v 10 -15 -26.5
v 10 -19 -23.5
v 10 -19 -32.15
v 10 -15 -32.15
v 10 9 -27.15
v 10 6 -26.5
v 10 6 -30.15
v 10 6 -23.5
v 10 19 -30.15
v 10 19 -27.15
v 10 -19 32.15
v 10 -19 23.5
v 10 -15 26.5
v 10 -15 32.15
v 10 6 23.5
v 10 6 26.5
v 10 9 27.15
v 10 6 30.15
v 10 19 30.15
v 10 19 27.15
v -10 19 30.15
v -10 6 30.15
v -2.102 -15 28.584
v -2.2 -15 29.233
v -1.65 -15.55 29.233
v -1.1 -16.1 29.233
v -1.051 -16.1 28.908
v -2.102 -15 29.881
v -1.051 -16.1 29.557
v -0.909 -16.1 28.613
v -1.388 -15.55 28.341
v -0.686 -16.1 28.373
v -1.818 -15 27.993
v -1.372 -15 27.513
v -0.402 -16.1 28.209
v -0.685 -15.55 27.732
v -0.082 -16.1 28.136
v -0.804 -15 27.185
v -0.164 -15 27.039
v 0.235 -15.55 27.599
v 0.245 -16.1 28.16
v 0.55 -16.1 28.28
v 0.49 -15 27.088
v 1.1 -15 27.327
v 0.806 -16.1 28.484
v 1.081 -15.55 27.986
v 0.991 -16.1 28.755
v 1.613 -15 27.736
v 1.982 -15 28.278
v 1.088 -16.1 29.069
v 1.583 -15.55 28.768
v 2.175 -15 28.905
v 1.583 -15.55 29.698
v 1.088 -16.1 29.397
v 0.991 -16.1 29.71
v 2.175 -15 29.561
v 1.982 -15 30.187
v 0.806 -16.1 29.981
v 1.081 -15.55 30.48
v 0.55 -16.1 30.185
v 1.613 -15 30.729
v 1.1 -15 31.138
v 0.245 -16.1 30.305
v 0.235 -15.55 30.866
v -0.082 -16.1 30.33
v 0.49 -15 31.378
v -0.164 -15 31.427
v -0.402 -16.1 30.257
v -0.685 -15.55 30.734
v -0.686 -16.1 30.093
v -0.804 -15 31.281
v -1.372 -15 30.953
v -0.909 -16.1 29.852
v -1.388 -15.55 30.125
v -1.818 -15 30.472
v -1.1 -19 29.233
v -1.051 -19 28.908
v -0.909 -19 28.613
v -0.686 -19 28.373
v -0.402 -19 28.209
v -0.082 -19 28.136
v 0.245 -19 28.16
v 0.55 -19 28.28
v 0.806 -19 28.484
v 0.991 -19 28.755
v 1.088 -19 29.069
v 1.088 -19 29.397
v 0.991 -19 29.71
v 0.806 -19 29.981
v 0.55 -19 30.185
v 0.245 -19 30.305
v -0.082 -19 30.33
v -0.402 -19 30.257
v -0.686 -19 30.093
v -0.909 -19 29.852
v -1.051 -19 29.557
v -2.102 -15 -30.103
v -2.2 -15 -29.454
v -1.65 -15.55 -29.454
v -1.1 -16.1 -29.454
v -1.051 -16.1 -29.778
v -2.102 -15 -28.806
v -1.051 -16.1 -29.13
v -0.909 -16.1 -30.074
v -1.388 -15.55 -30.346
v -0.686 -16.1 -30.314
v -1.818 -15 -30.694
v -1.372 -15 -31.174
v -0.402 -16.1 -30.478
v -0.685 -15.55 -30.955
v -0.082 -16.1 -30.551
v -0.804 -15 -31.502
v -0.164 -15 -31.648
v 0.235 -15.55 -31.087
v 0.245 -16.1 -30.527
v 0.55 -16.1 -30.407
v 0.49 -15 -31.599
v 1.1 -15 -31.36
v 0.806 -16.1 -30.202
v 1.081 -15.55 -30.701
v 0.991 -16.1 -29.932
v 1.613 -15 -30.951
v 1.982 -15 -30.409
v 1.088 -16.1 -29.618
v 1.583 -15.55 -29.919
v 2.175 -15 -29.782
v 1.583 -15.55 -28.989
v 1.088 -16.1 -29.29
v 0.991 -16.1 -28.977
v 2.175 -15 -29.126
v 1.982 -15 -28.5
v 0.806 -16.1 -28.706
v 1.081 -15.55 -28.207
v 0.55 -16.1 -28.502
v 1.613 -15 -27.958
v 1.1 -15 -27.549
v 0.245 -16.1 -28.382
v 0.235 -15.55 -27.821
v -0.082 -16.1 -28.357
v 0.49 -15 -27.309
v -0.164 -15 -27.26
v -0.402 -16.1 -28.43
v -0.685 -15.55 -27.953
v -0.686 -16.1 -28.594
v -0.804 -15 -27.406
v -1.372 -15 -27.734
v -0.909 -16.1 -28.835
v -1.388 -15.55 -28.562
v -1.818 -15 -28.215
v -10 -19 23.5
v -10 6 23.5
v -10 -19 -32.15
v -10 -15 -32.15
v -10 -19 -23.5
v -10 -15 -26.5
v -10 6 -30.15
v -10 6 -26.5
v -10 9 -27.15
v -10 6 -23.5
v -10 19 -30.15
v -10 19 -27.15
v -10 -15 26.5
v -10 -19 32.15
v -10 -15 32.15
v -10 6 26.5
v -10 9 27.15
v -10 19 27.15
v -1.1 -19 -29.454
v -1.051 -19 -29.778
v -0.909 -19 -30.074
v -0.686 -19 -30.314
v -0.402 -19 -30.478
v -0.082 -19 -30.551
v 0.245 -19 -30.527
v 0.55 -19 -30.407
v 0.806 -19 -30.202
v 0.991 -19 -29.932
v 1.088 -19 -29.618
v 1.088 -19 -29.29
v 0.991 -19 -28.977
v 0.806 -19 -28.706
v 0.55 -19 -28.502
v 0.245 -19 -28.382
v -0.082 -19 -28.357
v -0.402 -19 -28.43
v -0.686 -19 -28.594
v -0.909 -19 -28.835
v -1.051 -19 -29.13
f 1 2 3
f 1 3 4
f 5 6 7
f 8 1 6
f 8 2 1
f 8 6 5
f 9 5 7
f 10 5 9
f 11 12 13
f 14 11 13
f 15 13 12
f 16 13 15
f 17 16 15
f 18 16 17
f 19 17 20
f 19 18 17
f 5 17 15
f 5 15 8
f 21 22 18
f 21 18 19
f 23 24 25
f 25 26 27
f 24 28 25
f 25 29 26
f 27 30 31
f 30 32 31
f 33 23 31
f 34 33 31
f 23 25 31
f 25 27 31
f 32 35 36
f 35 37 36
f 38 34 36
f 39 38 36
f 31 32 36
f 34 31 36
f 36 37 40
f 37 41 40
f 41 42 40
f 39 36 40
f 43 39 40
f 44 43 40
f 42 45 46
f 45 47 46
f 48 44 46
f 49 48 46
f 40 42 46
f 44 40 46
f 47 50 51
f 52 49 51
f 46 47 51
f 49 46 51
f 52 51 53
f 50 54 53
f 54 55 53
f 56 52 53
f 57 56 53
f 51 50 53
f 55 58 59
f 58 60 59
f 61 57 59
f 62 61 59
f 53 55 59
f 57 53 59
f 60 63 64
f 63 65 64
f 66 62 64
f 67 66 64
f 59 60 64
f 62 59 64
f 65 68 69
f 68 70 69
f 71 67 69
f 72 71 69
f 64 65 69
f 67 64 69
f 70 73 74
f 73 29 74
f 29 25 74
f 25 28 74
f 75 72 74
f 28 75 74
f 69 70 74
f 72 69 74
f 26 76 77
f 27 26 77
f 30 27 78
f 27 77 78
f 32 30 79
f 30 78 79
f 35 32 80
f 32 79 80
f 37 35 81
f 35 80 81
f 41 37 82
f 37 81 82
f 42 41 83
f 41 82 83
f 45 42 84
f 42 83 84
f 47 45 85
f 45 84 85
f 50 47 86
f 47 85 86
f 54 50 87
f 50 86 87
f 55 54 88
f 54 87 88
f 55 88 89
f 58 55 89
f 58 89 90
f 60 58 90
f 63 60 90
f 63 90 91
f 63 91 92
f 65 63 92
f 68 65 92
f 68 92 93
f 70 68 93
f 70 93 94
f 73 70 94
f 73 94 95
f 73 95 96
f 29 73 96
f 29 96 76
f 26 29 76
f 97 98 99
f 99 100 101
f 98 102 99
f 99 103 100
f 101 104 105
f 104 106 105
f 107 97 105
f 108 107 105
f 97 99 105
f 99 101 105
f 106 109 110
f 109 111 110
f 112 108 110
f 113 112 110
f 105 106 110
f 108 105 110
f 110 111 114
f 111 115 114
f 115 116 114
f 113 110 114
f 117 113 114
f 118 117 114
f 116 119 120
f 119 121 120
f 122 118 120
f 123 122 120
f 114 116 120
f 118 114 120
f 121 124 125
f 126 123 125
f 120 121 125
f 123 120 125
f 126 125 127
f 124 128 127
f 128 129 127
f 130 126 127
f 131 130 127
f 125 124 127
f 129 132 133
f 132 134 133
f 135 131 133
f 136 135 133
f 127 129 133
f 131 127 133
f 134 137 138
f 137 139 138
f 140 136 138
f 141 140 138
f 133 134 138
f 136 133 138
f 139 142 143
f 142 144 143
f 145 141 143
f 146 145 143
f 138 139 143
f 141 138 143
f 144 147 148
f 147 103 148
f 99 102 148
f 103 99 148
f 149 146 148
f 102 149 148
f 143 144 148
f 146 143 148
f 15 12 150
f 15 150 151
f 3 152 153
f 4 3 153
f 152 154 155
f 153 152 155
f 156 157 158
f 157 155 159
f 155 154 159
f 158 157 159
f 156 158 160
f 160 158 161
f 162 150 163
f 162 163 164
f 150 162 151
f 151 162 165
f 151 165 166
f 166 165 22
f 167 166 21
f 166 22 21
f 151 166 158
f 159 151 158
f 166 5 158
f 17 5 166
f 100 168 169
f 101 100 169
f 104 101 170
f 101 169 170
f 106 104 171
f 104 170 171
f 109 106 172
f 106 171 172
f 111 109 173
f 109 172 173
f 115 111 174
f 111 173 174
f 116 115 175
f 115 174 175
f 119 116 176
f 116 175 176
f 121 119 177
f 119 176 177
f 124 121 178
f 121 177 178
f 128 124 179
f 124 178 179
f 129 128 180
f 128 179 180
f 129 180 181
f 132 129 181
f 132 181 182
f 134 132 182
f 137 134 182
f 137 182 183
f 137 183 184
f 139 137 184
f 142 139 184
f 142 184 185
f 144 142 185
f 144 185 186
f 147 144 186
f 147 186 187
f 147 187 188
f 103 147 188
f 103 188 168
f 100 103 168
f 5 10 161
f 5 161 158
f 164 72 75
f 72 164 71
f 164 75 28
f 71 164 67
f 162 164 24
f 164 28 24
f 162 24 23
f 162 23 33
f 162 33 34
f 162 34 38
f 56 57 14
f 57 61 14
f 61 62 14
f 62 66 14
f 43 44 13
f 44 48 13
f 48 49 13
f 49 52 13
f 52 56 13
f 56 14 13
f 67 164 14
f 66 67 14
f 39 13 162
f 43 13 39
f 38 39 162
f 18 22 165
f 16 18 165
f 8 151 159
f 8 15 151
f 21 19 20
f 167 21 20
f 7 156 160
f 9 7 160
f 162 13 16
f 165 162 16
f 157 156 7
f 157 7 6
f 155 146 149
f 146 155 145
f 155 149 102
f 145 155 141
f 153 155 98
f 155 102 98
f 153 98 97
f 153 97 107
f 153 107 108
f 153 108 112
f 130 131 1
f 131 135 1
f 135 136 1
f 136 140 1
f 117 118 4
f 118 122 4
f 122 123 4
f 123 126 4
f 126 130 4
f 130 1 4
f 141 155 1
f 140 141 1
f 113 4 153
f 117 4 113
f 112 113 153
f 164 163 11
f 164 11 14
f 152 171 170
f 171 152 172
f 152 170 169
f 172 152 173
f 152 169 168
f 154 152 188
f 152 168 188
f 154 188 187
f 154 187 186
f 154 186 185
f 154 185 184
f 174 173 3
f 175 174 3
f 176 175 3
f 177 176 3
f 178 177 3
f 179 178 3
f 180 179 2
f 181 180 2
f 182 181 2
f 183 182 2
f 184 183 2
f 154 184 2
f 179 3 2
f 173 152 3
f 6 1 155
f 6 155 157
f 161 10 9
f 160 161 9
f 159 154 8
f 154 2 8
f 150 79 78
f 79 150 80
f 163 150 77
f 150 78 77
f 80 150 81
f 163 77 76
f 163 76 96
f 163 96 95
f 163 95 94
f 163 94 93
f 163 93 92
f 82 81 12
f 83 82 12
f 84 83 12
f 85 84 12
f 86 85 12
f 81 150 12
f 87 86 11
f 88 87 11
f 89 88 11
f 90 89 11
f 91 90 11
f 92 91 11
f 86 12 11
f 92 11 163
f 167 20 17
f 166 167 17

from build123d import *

# Parameters (mm, degrees)
SKETCH1_W                                           = 60.3
SKETCH1_H                                           = 38
BOSS_EXTRUDE1_DEPTH                                 = 10
SKETCH3_W                                           = 20
SKETCH3_H                                           = 54.3
CUT_EXTRUDE1_DEPTH                                  = 10
SKETCH4_W                                           = 20
SKETCH4_H                                           = 47
CUT_EXTRUDE2_DEPTH                                  = 25
SKETCH6_W                                           = 10
SKETCH6_H                                           = 21
CUT_EXTRUDE3_DEPTH                                  = 3.65
SKETCH7_W                                           = 10
SKETCH7_H                                           = 21
CUT_EXTRUDE4_DEPTH                                  = 3.65
MOVE_FACE1_BY                                       = 2
MOVE_FACE1_2_BY                                     = 2
MOVE_FACE2_BY                                       = 10
CSK_FOR_M2_COUNTERSUNK_FLAT_HEAD_SCREW2_D           = 2.2
CSK_FOR_M2_COUNTERSUNK_FLAT_HEAD_SCREW2_DEPTH       = 4
CSK_FOR_M2_COUNTERSUNK_FLAT_HEAD_SCREW2_CSINK_D     = 4.4
CSK_FOR_M2_COUNTERSUNK_FLAT_HEAD_SCREW2_CSINK_ANGLE = 90


with BuildPart() as part:
    # Sketch1 → Boss-Extrude1 (new body)
    with BuildSketch(Plane(origin=(0, 0, 0), x_dir=(0, 0, -1), z_dir=(1, 0, 0))):
        Rectangle(SKETCH1_W, SKETCH1_H)
    extrude(amount=BOSS_EXTRUDE1_DEPTH)

    # Sketch3 → Cut-Extrude1 (cut)
    with BuildSketch(Plane(origin=(0, 19, 0), x_dir=(1, 0, 0), z_dir=(0, 1, 0))):
        Rectangle(SKETCH3_W, SKETCH3_H)
    extrude(amount=-CUT_EXTRUDE1_DEPTH, mode=Mode.SUBTRACT)

    # Sketch4 → Cut-Extrude2 (cut)
    with BuildSketch(Plane.XZ.offset(19)):
        Rectangle(SKETCH4_W, SKETCH4_H)
    extrude(amount=-CUT_EXTRUDE2_DEPTH, mode=Mode.SUBTRACT)

    # Sketch6 → Cut-Extrude3 (cut)
    with BuildSketch(Plane(origin=(0, 0, -30.15), x_dir=(-1, 0, 0), z_dir=(0, 0, -1))):
        with Locations((-5, -4.5)):
            Rectangle(SKETCH6_W, SKETCH6_H)
    extrude(amount=-CUT_EXTRUDE3_DEPTH, mode=Mode.SUBTRACT)

    # Sketch7 → Cut-Extrude4 (cut)
    with BuildSketch(Plane.XY.offset(30.15)):
        with Locations((5, -4.5)):
            Rectangle(SKETCH7_W, SKETCH7_H)
    extrude(amount=-CUT_EXTRUDE4_DEPTH, mode=Mode.SUBTRACT)

    # Move Face1: a face moved outward by 2.0
    extrude(part.faces().sort_by_distance((5, -17, 30.15))[0], amount=MOVE_FACE1_BY, dir=(0, 0, 1))

    # Move Face1 2: a face moved outward by 2.0
    extrude(part.faces().sort_by_distance((5, -17, -30.15))[0], amount=MOVE_FACE1_2_BY, dir=(0, 0, -1))

    # Move Face2: a face moved outward by 10.0
    extrude(part.faces().sort_by_distance((0, 0, 25.72))[0], amount=MOVE_FACE2_BY, dir=(-1, 0, 0))

    # CSK for M2 Countersunk Flat Head Screw2
    with Locations(Plane(origin=(0, -15, 0), x_dir=(1, 0, 0), z_dir=(0, 1, 0))):
        with Locations((0, -29.232676383), (0, 29.454263306)):
            CounterSinkHole(CSK_FOR_M2_COUNTERSUNK_FLAT_HEAD_SCREW2_D / 2, CSK_FOR_M2_COUNTERSUNK_FLAT_HEAD_SCREW2_CSINK_D / 2, depth=CSK_FOR_M2_COUNTERSUNK_FLAT_HEAD_SCREW2_DEPTH, counter_sink_angle=CSK_FOR_M2_COUNTERSUNK_FLAT_HEAD_SCREW2_CSINK_ANGLE)


solid = part.part
